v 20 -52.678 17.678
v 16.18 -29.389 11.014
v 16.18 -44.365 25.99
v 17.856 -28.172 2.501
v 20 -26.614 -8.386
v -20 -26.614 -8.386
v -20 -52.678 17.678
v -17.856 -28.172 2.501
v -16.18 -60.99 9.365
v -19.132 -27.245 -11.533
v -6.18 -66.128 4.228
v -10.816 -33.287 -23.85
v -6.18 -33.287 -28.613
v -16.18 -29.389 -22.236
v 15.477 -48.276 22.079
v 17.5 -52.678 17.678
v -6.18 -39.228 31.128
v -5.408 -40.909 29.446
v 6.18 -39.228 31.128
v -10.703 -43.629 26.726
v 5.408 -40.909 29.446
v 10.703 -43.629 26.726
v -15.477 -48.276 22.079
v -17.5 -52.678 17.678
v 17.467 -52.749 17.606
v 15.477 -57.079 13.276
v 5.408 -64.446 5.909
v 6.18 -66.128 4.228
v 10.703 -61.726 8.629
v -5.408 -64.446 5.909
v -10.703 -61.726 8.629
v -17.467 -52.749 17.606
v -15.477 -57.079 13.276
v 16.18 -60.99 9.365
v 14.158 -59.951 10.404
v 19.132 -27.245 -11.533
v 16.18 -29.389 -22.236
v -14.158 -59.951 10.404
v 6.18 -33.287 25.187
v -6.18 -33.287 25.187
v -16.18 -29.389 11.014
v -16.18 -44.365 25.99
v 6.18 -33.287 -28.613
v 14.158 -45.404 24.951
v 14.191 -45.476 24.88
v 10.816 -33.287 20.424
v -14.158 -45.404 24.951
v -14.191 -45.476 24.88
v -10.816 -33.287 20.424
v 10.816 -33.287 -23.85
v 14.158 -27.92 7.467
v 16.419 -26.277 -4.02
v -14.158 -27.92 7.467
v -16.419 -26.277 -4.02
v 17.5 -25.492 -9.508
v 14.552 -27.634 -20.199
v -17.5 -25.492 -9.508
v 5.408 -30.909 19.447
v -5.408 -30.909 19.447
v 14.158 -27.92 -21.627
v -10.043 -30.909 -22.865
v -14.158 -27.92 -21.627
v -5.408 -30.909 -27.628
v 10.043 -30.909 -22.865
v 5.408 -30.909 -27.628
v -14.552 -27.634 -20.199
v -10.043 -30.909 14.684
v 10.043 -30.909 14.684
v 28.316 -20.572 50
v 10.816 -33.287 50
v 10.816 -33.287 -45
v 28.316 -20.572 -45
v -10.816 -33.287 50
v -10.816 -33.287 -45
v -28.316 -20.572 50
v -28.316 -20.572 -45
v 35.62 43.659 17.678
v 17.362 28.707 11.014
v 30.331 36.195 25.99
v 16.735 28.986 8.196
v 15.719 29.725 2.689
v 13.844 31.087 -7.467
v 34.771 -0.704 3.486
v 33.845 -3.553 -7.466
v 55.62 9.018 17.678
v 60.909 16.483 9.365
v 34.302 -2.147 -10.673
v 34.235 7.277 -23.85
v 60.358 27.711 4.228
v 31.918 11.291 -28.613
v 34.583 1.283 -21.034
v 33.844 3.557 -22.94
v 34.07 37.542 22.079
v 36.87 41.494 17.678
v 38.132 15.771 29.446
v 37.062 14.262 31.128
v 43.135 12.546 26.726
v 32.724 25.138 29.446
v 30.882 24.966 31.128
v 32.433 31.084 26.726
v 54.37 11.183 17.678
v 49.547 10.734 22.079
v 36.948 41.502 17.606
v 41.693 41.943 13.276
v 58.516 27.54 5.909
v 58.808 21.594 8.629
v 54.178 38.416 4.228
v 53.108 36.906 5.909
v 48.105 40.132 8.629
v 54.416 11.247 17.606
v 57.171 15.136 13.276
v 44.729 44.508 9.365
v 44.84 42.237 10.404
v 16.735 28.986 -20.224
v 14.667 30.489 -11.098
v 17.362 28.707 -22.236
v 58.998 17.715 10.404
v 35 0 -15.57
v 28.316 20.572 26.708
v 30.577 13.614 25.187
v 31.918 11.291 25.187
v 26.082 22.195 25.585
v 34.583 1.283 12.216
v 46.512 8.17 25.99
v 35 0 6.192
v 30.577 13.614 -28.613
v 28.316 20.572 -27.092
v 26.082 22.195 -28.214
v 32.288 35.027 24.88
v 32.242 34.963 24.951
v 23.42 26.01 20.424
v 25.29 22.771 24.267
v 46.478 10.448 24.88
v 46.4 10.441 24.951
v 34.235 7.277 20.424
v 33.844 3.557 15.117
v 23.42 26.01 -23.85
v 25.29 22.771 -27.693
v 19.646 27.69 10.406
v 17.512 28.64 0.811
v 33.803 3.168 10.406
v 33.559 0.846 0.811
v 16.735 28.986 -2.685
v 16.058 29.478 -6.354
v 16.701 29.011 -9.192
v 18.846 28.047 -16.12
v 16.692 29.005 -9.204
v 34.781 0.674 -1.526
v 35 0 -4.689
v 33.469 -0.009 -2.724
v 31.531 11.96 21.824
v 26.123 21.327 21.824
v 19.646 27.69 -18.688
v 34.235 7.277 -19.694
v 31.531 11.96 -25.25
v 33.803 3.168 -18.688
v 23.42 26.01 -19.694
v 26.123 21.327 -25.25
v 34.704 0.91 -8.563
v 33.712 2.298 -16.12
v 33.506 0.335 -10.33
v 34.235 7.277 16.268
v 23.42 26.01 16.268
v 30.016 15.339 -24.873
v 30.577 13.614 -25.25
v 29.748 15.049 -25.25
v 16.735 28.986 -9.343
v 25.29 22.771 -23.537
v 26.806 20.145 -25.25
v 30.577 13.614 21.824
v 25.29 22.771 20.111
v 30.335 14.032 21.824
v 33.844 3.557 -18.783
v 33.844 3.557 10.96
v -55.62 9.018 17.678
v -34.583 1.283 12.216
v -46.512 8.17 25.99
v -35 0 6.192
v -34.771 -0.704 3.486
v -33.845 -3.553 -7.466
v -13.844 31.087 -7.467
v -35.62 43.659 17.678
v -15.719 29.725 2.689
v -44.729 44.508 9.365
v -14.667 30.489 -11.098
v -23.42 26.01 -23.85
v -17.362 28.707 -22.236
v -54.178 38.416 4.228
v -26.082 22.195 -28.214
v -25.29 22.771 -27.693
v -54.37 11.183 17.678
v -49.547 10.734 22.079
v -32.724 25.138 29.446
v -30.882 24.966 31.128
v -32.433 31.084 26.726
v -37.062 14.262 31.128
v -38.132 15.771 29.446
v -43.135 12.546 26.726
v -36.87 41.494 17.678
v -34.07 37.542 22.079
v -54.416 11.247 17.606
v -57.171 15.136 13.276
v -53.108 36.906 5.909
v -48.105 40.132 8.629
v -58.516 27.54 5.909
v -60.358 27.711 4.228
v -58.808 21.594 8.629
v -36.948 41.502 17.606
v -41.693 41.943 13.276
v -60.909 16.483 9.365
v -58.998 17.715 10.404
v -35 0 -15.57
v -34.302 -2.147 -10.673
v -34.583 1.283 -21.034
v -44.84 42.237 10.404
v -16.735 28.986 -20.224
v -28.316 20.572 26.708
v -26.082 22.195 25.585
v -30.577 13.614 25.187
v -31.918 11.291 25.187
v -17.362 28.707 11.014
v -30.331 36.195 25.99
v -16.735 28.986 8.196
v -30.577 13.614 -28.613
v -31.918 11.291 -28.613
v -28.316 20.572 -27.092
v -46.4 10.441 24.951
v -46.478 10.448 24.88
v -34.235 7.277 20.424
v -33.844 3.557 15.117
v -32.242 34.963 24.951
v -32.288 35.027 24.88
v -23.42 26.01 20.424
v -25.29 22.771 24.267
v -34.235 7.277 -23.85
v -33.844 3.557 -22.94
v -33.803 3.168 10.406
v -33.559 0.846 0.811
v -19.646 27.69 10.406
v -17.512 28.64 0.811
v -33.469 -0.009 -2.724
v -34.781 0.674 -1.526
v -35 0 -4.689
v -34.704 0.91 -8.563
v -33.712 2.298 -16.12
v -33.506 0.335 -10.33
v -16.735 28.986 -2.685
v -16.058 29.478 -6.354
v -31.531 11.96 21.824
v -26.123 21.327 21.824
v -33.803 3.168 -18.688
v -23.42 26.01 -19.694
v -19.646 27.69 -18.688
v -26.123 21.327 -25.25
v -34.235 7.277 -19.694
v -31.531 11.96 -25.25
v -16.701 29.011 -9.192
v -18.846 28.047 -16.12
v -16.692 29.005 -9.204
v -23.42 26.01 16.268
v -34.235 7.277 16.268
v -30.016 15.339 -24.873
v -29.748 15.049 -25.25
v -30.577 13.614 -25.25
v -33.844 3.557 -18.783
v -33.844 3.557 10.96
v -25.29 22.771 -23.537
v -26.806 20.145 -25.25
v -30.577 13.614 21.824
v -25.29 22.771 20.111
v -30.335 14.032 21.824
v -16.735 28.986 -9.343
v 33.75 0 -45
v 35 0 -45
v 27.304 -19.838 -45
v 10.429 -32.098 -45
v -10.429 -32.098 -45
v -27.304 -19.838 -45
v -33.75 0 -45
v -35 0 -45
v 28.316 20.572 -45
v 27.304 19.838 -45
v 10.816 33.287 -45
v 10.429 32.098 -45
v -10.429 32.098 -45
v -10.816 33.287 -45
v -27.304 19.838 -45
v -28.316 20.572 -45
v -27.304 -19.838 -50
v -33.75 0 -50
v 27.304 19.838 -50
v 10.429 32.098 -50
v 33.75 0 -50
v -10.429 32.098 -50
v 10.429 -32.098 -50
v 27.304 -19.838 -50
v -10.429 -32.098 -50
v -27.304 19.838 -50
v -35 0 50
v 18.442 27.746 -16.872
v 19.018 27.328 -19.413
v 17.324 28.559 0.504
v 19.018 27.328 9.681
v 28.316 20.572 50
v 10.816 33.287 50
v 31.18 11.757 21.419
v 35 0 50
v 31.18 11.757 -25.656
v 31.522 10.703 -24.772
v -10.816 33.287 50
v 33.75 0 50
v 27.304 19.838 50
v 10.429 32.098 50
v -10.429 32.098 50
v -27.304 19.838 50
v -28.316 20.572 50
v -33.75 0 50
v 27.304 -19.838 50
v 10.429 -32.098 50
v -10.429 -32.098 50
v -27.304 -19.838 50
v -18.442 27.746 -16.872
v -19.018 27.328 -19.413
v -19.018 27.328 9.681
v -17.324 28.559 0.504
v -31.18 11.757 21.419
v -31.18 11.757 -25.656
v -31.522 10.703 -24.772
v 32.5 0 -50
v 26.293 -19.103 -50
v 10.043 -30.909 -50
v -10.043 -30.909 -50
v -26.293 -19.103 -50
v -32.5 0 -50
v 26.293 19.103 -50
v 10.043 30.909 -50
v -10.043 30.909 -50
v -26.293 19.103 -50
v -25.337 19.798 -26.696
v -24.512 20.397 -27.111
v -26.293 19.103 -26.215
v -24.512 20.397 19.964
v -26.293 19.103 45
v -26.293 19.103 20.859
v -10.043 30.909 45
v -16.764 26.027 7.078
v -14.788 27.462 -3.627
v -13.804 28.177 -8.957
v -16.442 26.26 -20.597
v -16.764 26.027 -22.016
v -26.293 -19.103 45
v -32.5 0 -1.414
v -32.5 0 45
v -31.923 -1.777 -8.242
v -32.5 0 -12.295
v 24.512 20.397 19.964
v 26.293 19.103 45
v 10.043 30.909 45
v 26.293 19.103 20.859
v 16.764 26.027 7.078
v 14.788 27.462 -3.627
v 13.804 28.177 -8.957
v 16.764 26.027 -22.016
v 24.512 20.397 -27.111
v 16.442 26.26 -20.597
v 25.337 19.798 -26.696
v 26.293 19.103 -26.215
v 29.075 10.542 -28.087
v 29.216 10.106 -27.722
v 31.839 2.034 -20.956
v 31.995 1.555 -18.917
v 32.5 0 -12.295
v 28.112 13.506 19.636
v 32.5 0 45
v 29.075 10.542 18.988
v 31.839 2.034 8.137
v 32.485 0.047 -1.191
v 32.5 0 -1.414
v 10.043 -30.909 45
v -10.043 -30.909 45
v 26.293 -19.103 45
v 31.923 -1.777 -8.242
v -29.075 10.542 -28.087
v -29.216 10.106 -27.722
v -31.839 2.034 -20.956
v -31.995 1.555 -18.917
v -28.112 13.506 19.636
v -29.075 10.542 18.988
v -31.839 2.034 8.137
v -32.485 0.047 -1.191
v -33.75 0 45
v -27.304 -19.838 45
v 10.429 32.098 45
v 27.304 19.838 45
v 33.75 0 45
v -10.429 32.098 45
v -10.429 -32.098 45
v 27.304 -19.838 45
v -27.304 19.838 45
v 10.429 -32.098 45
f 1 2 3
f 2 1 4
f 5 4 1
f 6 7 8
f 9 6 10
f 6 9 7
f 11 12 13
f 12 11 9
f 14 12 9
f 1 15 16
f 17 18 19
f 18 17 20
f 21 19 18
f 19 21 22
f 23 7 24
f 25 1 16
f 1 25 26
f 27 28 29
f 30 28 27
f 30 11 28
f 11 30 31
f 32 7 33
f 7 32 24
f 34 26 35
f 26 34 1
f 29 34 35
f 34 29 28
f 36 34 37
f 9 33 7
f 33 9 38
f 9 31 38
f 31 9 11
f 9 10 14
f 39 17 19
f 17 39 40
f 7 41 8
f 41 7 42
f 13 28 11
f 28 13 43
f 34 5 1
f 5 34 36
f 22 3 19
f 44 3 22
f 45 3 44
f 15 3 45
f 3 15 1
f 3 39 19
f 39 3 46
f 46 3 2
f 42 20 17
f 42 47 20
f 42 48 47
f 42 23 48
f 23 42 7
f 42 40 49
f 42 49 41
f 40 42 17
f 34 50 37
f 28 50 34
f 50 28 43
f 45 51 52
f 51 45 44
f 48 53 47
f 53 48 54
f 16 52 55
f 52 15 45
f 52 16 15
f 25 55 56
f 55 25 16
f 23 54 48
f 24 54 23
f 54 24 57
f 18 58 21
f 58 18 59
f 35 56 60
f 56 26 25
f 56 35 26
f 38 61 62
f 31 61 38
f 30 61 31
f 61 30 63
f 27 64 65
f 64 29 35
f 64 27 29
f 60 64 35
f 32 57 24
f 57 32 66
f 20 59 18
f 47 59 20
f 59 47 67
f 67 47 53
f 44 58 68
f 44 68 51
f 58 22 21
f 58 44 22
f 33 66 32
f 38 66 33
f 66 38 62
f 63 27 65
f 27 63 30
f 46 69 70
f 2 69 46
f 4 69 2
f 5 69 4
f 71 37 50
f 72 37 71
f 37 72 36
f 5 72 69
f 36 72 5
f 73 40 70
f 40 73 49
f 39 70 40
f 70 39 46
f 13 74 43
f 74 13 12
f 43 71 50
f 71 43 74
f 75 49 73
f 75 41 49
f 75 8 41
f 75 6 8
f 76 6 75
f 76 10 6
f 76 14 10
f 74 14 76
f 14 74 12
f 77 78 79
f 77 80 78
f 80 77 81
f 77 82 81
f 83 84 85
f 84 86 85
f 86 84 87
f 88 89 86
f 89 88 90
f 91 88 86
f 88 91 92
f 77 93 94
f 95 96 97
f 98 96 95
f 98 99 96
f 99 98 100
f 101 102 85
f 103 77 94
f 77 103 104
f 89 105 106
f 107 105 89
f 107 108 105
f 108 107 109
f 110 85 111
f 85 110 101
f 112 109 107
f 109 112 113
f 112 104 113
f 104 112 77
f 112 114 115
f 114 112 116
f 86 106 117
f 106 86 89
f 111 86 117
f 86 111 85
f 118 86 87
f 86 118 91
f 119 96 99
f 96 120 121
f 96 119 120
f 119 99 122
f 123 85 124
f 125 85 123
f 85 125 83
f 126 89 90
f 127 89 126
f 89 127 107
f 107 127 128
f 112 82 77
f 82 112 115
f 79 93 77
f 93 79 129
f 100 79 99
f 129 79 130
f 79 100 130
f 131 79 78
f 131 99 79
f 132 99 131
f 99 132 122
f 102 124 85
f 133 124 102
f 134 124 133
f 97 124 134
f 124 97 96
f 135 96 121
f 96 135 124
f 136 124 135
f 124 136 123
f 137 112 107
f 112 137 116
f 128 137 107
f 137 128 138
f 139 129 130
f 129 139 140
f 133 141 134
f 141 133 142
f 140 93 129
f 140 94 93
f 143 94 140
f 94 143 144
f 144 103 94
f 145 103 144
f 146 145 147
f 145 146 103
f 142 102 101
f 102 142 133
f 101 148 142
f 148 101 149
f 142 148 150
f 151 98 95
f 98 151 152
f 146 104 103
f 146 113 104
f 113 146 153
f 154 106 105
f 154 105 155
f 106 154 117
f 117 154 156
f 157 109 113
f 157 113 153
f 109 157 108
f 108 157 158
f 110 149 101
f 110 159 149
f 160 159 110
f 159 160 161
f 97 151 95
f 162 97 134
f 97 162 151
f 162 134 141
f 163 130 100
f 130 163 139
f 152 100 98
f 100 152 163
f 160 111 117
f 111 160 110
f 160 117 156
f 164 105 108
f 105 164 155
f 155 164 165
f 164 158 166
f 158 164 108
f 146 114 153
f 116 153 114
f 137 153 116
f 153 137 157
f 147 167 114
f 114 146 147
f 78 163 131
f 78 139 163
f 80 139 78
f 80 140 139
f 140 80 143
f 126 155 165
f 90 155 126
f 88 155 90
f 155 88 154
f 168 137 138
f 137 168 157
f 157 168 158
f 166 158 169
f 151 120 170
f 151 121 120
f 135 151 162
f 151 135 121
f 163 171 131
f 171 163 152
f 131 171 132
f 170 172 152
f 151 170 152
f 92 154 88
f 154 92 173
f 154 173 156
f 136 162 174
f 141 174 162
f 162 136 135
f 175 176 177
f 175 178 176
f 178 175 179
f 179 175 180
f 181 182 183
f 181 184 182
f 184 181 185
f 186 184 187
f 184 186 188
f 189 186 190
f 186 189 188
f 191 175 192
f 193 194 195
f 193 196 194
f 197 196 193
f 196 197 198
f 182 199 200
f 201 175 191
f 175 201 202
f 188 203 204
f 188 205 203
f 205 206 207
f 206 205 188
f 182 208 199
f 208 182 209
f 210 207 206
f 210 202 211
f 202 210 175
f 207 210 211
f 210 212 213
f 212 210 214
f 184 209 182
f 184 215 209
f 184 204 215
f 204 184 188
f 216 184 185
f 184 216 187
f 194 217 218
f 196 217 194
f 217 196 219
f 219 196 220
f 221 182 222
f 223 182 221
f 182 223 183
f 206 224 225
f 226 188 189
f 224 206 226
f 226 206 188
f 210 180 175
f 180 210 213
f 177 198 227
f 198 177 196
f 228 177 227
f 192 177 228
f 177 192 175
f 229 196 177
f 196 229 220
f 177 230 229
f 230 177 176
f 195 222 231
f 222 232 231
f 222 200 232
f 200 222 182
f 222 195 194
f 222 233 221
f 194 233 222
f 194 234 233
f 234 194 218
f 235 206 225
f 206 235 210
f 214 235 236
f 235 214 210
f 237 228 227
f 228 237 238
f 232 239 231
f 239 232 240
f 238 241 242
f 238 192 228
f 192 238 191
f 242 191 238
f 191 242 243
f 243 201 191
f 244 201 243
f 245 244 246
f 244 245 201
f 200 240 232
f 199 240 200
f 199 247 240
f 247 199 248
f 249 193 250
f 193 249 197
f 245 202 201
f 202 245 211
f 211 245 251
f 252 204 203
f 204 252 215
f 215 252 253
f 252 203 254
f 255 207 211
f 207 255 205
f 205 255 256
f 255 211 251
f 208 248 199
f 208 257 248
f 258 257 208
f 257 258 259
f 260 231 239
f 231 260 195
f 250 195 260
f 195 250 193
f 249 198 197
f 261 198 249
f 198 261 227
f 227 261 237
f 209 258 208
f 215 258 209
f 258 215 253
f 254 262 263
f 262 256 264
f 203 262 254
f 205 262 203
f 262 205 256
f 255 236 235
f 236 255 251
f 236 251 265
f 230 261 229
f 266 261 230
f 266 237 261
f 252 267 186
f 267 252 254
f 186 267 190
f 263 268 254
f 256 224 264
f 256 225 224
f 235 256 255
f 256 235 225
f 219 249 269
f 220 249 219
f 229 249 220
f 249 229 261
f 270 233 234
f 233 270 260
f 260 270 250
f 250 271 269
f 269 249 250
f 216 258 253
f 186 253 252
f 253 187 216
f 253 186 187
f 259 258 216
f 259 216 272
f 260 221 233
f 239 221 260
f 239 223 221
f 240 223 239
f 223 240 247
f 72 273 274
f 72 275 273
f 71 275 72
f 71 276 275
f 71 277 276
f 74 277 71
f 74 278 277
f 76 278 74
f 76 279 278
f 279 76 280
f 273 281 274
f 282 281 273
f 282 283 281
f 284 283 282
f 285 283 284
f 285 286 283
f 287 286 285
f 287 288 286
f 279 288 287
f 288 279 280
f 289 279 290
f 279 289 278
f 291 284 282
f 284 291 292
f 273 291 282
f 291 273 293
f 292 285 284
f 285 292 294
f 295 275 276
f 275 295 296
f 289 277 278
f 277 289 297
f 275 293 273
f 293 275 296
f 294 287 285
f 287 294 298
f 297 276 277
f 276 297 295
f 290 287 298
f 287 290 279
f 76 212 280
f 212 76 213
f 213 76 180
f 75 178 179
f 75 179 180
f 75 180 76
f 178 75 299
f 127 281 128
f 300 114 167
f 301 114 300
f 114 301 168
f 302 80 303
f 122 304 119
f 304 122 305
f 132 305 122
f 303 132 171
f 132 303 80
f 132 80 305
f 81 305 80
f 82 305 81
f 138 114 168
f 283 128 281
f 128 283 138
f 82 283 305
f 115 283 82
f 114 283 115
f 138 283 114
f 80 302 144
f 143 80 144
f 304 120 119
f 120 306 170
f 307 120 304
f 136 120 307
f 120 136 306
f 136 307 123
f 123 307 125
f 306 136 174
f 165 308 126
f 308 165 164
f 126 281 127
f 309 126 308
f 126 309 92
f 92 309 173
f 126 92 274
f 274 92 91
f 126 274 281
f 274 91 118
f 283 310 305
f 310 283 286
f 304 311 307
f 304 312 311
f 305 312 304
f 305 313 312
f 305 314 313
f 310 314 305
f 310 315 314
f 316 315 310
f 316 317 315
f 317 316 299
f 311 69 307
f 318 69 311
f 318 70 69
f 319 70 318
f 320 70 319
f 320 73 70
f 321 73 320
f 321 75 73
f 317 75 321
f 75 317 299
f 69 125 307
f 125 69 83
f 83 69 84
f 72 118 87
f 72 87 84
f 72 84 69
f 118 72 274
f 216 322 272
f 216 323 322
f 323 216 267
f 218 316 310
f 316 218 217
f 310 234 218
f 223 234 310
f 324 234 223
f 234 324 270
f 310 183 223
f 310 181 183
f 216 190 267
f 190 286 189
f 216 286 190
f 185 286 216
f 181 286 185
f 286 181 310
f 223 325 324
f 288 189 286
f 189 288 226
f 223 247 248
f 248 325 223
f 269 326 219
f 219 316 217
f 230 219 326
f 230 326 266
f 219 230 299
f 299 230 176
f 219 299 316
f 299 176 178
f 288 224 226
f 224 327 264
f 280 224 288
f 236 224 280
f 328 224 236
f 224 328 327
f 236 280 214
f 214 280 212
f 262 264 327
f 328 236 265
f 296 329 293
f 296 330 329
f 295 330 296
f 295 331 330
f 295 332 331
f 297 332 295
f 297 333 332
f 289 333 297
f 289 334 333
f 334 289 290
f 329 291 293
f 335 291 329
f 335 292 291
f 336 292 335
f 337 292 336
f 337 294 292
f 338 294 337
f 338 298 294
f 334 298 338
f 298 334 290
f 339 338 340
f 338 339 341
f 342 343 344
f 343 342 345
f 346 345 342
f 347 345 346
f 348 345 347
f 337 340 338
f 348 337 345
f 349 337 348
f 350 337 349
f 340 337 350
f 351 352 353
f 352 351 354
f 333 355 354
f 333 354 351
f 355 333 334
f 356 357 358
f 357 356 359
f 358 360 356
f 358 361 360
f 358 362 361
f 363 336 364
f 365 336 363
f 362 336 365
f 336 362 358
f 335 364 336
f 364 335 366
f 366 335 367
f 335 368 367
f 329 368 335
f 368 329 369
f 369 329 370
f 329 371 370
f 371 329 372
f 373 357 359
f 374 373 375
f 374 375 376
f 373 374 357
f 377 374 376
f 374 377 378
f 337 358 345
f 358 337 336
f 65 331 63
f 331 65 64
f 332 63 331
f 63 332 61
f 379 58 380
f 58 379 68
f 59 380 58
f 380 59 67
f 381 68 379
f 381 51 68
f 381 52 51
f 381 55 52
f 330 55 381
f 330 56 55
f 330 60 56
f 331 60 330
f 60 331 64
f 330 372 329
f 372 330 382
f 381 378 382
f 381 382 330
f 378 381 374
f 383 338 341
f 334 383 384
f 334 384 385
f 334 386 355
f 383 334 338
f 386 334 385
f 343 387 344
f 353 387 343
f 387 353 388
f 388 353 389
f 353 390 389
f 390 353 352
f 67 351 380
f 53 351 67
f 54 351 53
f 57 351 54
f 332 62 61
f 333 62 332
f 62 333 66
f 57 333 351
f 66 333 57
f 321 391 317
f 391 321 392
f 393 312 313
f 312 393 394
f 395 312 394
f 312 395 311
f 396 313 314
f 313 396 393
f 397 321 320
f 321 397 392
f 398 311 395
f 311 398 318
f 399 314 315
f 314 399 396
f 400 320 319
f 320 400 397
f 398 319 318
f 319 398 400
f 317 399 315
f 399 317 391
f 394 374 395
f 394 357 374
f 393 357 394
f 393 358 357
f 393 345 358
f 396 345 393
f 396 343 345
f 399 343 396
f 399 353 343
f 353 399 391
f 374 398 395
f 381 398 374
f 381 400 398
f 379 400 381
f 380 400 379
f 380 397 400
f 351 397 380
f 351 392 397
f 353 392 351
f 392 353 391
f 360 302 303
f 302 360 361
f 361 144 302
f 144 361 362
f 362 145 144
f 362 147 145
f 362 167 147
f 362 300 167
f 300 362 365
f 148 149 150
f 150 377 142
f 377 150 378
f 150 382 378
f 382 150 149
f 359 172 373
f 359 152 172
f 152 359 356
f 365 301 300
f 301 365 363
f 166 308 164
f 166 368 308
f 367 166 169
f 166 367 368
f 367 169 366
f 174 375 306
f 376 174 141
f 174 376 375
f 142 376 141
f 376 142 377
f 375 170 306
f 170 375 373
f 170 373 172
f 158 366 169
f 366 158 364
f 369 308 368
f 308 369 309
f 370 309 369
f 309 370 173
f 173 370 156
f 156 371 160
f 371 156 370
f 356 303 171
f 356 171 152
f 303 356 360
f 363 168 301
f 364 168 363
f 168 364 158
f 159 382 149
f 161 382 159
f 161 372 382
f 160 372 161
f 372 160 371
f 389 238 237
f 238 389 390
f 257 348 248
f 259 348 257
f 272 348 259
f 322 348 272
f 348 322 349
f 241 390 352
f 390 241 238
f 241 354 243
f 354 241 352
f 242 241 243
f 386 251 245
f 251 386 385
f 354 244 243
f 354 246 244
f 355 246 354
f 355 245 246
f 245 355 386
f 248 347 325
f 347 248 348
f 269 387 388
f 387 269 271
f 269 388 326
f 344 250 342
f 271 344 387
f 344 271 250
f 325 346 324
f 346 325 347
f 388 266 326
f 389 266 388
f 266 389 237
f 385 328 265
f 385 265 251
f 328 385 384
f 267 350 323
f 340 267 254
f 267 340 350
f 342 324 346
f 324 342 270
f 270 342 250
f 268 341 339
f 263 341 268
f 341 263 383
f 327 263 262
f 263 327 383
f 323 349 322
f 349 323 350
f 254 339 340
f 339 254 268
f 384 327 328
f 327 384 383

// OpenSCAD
// file: x-way.scad
/* [Render] */
$fa=1;
$fs=0.4;
$fn=10;
$show_helpers = false;

/* [General] */
$wall_thickness = 2.5;

/* [Main Body] */
$main_height = 100;
$main_radius = 35;
$joining_height = 10;
$joining_radius = $main_radius - $wall_thickness / 2;

/* [Tubes] */
$tube_height = $main_height / 2;
$tube_radius = $main_radius - 15;
$tube_hole_dimensions = 15;
$tube_hole_offset = 0;

// Parts
module main_body() {
    difference() {
        // Cylinder
        main_body_outer();
        main_body_inner();

        // Top joining
        translate([0, 0, $main_height/2]) cylinder(h = $joining_height, r = $joining_radius, center = true);

        // Bottom joining
        translate([0, 0, -$main_height/2])
        difference() {
            cylinder(h = $joining_height, r = $main_radius + 1, center = true);
            cylinder(h = $joining_height, r = $joining_radius, center = true);
        }
    }
}

module main_body_outer() {
    cylinder(h = $main_height, r = $main_radius, center = true);
}

module main_body_inner() {
    cylinder(h = $main_height + 1, r = $main_radius - $wall_thickness, center = true);
}

module tube_body(r, t) {
    difference() {
        difference() {
            tube_body_outer(r, t);
            tube_body_inner(r, t);
        }
        main_body_outer();
    }
}

module tube_body_outer(r, t) {
    translate(t) {
        rotate(r) {
            cylinder(h = $tube_height, r = $tube_radius, center = true);
        }
    }
}

module tube_body_inner(r, t) {
    translate(t) {
        rotate(r) {
            cylinder(h = $tube_height + 1, r = $tube_radius - $wall_thickness, center = true);
        }
    }
}

// Assembled modules

module xWay(count) {
    $max_angle = 180;
    $per_item = $max_angle / count;
    
    if(count > 0) {
        for (i = [0 : count - 1]) {
            rotate([0, 0, i * $per_item * 2]) tube_body([45, 0, 0], [0, -$main_radius, 0]);
        }
    }

    difference() {
        main_body();
        if(count > 0) {
            for (i = [0 : count - 1]) {
                rotate([0, 0, i * $per_item * 2]) tube_body_inner([45, 0, 0], [0, -$main_radius, 0]);
            }
        }
    }
}
// main file
use <x-way.scad>;

/*  Check settings ("customizer variables") in x-way.scad.
    The current config is pre-defined for a 150x150x150mm printing area.
    To tweak use one of the following:
    1. via OpenSCAD's Command-Line
        Use the `--D` flag to change variables.
        E.g. `--D $fn=100` to make the circles smooth.
    2. via OpenSCAD GUI
        Open this file and check the Customizer panel.
        In case the variables don't show up, proceed to the 3rd option.
    3. via an Editor (or OpenSCAD GUI)
        Open the file from above (`use <THIS FILE.scad>`) in either 
        an Editor or OpenSCAD GUI and change the variables in code
        or inside the Customizer. 
        Afterwards (re-)open this file in OpenSCAD and see the changes.

        Note: Editing the variables inside the code will affect ALL models
        depending on it. This can have advantages, but also disadvantages.
*/

// --- 

xWay(3);
